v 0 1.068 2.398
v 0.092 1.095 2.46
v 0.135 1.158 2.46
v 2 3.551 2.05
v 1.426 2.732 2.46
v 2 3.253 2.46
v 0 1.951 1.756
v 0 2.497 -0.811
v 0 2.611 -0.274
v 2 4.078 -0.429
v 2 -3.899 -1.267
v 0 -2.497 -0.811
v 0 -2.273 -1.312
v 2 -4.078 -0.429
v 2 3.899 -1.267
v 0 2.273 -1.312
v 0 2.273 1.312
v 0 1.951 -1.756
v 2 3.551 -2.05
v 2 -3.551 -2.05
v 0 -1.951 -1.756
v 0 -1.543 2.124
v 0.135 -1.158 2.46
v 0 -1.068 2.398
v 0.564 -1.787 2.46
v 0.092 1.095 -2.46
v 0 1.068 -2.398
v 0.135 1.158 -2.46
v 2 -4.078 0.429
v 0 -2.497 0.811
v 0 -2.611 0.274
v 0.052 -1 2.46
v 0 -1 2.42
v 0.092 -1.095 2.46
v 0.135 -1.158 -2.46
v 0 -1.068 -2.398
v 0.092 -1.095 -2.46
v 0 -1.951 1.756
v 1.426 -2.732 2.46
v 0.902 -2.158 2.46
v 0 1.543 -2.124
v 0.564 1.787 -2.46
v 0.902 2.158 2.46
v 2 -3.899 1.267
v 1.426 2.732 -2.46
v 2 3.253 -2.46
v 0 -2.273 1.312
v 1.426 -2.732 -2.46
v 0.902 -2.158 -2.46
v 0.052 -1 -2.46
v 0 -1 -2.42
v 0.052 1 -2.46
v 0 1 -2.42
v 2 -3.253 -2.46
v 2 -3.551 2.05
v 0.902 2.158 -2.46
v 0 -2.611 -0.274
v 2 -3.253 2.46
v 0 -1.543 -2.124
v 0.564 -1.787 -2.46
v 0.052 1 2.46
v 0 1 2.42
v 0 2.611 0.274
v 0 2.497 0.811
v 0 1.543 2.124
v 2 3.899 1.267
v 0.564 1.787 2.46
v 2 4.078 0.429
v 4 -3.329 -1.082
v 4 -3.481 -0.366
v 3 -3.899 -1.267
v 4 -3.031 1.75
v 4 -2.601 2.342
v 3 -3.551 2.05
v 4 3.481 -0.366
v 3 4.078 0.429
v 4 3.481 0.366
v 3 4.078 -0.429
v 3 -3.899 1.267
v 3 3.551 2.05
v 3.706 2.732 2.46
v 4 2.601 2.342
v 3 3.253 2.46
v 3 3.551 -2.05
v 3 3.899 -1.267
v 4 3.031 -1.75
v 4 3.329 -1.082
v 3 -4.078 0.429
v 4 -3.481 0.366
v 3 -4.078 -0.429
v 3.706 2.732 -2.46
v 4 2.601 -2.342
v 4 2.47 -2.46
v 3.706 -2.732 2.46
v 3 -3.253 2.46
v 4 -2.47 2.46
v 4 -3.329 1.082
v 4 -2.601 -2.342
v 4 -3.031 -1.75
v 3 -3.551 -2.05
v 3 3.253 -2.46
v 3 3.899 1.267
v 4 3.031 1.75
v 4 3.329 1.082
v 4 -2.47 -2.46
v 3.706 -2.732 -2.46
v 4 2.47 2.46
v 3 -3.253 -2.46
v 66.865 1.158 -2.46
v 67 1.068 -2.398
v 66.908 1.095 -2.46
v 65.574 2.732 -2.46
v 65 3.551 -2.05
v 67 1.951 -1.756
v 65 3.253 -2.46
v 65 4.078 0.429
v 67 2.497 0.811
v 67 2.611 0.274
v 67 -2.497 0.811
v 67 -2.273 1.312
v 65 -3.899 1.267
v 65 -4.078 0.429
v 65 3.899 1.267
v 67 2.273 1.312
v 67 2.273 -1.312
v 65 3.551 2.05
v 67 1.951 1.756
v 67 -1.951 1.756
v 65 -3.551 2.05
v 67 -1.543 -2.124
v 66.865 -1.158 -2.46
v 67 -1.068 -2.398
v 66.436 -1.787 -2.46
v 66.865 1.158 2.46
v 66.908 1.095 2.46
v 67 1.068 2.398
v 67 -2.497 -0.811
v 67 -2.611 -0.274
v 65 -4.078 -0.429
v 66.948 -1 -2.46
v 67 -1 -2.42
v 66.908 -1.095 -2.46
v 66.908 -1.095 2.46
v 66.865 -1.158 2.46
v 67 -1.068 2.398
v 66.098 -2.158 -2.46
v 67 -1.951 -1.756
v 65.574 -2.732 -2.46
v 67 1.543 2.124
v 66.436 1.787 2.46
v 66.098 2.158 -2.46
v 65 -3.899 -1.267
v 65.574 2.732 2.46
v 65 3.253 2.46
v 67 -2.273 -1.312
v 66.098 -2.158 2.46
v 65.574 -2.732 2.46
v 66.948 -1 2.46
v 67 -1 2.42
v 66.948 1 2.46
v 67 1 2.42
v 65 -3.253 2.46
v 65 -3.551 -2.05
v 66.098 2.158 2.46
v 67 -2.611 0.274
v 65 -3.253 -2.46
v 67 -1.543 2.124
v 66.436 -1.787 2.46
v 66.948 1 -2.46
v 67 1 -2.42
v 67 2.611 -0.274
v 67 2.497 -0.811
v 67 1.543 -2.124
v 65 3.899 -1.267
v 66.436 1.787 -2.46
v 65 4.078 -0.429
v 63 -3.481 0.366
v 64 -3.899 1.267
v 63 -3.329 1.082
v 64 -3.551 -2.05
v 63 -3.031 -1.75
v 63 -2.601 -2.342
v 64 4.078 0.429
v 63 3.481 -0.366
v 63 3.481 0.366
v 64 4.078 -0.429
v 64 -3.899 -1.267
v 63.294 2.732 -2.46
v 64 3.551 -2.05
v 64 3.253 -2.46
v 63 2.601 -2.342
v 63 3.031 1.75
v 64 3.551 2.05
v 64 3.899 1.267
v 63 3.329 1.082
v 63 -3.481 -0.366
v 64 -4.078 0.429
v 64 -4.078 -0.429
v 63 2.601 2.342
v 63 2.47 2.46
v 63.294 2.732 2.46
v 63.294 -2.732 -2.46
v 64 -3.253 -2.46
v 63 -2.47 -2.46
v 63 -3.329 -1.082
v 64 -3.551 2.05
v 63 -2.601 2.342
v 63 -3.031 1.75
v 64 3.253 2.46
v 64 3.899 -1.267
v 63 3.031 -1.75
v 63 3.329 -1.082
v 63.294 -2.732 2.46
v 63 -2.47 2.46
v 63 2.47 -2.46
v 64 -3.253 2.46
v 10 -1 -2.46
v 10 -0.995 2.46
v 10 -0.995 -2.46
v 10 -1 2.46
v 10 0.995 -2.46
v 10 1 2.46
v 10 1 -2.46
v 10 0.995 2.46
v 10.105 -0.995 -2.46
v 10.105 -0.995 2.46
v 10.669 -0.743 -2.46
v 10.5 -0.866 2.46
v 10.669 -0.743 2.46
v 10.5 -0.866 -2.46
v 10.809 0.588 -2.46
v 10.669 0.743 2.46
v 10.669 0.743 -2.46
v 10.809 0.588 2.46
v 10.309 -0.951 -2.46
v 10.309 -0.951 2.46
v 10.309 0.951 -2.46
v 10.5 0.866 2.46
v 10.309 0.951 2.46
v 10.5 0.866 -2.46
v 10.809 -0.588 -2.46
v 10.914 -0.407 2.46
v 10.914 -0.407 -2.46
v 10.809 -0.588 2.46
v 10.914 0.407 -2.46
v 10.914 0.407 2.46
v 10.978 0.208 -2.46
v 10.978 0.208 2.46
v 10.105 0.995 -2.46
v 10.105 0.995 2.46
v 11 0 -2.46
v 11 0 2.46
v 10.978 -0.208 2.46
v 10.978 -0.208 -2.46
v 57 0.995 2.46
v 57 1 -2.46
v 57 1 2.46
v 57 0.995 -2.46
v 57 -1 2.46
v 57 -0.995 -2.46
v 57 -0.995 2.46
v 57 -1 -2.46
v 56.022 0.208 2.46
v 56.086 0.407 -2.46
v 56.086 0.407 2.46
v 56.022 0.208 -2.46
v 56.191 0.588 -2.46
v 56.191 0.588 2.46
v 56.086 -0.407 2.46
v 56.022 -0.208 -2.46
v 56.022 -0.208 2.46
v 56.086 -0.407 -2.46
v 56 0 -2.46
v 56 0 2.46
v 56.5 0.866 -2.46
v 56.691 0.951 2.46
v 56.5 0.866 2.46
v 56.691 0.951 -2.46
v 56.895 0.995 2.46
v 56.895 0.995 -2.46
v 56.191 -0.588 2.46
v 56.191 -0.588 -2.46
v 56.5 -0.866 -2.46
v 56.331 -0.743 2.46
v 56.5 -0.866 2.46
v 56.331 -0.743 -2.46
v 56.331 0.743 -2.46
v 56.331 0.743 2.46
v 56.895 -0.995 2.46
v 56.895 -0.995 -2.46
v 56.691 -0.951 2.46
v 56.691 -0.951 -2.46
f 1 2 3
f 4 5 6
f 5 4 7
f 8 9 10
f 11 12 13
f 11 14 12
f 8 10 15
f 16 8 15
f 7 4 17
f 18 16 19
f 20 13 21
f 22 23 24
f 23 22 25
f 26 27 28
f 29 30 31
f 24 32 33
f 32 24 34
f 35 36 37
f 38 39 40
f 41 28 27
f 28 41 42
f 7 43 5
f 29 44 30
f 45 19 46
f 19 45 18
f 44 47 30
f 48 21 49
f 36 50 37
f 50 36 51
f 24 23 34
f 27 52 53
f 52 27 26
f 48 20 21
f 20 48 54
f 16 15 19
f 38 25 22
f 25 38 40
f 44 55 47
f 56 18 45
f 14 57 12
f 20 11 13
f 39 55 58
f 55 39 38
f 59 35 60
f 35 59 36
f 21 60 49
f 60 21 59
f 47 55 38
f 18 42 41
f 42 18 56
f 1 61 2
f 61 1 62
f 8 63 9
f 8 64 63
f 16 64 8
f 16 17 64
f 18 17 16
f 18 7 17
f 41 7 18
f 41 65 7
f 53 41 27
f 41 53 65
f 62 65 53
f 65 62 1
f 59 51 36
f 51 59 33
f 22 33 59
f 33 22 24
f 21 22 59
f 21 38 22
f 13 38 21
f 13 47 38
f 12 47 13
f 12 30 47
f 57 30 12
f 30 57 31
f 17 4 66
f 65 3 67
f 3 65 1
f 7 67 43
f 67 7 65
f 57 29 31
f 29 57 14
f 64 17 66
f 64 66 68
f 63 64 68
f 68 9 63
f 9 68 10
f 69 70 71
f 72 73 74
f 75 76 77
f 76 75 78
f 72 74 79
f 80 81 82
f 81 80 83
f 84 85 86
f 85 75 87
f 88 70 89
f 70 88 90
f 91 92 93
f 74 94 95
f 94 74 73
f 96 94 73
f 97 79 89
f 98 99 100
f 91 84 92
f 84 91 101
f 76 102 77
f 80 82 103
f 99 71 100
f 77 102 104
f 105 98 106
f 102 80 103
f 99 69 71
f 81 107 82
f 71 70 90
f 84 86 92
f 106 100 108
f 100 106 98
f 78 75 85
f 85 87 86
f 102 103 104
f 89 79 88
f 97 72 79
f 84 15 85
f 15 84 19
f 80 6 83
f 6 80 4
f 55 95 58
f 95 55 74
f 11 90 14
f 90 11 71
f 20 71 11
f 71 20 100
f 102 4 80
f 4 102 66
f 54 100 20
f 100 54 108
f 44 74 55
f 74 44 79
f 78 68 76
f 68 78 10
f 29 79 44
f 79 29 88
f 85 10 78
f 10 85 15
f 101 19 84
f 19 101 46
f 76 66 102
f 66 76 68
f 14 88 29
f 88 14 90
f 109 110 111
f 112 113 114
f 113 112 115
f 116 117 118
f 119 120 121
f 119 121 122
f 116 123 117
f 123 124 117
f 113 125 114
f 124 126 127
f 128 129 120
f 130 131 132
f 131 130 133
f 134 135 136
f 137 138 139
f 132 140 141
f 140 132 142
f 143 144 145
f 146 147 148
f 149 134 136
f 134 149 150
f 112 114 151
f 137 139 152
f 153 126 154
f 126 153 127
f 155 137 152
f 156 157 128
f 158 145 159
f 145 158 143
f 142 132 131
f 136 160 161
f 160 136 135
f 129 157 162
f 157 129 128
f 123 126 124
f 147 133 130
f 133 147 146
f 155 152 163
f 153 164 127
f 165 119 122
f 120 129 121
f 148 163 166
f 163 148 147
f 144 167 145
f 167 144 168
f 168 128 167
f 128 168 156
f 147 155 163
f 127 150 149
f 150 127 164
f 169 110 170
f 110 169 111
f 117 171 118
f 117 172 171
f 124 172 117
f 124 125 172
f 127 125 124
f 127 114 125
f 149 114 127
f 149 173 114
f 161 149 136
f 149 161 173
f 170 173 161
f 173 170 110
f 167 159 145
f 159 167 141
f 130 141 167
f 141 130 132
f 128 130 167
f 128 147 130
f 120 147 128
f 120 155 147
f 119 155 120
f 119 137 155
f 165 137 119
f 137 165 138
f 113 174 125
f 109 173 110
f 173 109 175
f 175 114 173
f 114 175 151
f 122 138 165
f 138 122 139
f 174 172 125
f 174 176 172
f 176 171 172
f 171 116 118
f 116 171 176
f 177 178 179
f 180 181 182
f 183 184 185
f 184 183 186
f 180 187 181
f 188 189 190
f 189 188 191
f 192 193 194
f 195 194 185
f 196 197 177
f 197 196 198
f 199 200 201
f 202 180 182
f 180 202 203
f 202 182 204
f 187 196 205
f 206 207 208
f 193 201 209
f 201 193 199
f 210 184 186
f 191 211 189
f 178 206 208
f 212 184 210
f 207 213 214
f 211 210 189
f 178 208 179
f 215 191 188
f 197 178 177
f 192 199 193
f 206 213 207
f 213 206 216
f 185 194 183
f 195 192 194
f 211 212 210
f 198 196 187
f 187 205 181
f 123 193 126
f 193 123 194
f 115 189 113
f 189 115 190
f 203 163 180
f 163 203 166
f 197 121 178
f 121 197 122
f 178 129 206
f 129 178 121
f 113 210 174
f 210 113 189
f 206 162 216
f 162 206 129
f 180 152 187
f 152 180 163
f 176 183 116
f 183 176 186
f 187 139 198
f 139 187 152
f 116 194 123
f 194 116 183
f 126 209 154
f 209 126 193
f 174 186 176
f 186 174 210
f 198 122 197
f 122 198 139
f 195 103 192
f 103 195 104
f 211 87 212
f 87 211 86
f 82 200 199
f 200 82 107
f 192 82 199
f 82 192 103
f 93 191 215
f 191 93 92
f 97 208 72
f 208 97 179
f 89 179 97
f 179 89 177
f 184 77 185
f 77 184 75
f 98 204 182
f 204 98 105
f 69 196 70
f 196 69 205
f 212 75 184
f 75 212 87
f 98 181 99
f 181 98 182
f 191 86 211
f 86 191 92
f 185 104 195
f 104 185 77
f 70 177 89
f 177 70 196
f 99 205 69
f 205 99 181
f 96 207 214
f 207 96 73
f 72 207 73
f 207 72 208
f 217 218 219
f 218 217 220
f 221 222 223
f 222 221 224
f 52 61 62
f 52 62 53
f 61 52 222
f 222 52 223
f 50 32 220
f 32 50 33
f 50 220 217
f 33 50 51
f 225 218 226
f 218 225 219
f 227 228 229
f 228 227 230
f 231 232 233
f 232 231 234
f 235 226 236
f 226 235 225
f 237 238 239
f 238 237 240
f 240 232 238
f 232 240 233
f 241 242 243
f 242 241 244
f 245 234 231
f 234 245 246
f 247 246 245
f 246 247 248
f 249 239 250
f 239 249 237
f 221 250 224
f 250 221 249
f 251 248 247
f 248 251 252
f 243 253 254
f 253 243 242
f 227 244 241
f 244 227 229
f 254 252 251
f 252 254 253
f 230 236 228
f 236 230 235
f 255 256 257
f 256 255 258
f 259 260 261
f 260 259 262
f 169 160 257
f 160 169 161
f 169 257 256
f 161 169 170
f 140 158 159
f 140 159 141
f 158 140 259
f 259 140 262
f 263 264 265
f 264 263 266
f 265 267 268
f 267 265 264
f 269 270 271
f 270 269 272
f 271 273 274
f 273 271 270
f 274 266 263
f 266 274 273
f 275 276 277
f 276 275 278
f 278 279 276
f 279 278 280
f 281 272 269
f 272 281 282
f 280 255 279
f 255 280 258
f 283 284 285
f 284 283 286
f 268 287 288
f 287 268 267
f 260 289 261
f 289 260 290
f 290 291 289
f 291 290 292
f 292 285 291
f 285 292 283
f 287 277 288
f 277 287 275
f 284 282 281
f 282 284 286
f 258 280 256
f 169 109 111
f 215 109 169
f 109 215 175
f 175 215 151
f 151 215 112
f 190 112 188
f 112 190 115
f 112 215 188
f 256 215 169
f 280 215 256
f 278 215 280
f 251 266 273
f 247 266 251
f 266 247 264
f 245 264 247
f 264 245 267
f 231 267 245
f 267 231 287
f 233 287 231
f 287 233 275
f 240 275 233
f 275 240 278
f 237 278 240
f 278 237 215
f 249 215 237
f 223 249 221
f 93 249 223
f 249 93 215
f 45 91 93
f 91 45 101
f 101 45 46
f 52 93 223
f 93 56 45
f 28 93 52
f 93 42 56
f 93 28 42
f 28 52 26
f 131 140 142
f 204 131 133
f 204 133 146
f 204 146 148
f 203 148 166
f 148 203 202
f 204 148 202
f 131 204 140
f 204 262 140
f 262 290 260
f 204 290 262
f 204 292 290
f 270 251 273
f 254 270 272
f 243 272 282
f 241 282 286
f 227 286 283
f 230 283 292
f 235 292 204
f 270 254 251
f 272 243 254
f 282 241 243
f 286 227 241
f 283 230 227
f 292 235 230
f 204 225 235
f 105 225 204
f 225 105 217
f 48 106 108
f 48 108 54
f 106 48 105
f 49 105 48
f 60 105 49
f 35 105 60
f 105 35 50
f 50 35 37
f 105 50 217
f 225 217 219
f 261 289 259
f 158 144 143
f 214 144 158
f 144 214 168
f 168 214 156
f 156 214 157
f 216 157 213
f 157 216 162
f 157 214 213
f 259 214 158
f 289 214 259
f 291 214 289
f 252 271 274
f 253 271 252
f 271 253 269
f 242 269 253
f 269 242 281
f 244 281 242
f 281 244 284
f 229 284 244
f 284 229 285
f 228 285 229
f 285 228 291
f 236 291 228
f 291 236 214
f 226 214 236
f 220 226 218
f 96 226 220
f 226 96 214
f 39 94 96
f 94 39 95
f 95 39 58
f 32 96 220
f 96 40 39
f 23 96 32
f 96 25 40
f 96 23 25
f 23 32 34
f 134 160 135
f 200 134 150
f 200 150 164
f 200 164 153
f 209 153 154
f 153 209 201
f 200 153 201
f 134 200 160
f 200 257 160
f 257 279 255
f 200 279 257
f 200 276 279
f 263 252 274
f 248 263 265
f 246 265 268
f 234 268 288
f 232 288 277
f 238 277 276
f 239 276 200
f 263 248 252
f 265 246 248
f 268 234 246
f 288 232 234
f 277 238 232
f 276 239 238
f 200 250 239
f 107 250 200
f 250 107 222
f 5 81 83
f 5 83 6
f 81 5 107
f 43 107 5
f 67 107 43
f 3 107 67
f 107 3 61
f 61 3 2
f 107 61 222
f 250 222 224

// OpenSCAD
// The total length of the pin.
pin_length = 67;
// The radius of the pin shaft.
pin_radius = 3.5;
// The length of the head of the pin.
pin_head_length = 4;
// The lip around the pin head. This is the bit that grips the sides of the pin hole.
pin_head_lip = 0.6;
// The length of the slot on the pin.
slot_length = 10;
// The width of the slot in the pin.
slot_width = 2;
// The number of sides of the pin shaft and pin head.
sides = 30;
// The fractional falttening of the shaft. For example with a pin shaft radius of 5mm, then 0.1 puts 0.5mm deep flats on the pin.
flat = 0.2;

total_pin_radius = pin_radius + pin_head_lip;

module pin_head()
{
	union()
	{
		cylinder( r1 = pin_radius*0.75, r2 = pin_radius+pin_head_lip, h = pin_head_length*2/4, $fn = sides);
		translate([0,0, pin_head_length*3/4])cylinder( r1 = pin_radius+pin_head_lip, r2 = pin_radius, h = pin_head_length*1/4, $fn = sides);
		translate([0,0, pin_head_length*2/4])cylinder( r1 = pin_radius+pin_head_lip, r2 = pin_radius+pin_head_lip, h = pin_head_length*1/4, $fn = sides);
	}
}

module slot()
{
	slot_depth = 2*total_pin_radius + 0.1;
	union()
	{
		translate([ -slot_depth/2, -slot_width/2, 0])cube([slot_depth, slot_width, slot_length]);
		rotate([0, 90, 0])cylinder( r1 = slot_width/2, r2 = slot_width/2, h = slot_depth, center = true, $fn = sides);
		translate([0, 0, slot_length])rotate([0, 90, 0])cylinder( r1 = slot_width/2, r2 = slot_width/2, h = slot_depth, center = true, $fn = sides);
	}
}

module shaft()
{
	union()
	{
		pin_head();
		translate([0,0, pin_head_length])cylinder( r1 = pin_radius, r2 = pin_radius, h = pin_length - 2*pin_head_length + 0.1, $fn = sides);
		translate([0, 0, pin_length ])rotate([0,180,0])pin_head();
	}
}


module flat()
{
	flat_depth = flat*total_pin_radius;
	flat_width = 2*total_pin_radius;
	union()
	{
		translate([total_pin_radius - flat_depth, 0, pin_length/2])cube([flat_depth*2, 2*total_pin_radius, pin_length + 0.1], center = true);
		translate([-(total_pin_radius - flat_depth), 0, pin_length/2])cube([flat_depth*2, 2*total_pin_radius, pin_length + 0.1], center = true);
	}
}

module pin()
{
	rotate([0, 90, 0])
	difference()
	{
		shaft();
		slot();
		translate([0,0,pin_length - slot_length])slot();
		flat();
	}
}

pin();
